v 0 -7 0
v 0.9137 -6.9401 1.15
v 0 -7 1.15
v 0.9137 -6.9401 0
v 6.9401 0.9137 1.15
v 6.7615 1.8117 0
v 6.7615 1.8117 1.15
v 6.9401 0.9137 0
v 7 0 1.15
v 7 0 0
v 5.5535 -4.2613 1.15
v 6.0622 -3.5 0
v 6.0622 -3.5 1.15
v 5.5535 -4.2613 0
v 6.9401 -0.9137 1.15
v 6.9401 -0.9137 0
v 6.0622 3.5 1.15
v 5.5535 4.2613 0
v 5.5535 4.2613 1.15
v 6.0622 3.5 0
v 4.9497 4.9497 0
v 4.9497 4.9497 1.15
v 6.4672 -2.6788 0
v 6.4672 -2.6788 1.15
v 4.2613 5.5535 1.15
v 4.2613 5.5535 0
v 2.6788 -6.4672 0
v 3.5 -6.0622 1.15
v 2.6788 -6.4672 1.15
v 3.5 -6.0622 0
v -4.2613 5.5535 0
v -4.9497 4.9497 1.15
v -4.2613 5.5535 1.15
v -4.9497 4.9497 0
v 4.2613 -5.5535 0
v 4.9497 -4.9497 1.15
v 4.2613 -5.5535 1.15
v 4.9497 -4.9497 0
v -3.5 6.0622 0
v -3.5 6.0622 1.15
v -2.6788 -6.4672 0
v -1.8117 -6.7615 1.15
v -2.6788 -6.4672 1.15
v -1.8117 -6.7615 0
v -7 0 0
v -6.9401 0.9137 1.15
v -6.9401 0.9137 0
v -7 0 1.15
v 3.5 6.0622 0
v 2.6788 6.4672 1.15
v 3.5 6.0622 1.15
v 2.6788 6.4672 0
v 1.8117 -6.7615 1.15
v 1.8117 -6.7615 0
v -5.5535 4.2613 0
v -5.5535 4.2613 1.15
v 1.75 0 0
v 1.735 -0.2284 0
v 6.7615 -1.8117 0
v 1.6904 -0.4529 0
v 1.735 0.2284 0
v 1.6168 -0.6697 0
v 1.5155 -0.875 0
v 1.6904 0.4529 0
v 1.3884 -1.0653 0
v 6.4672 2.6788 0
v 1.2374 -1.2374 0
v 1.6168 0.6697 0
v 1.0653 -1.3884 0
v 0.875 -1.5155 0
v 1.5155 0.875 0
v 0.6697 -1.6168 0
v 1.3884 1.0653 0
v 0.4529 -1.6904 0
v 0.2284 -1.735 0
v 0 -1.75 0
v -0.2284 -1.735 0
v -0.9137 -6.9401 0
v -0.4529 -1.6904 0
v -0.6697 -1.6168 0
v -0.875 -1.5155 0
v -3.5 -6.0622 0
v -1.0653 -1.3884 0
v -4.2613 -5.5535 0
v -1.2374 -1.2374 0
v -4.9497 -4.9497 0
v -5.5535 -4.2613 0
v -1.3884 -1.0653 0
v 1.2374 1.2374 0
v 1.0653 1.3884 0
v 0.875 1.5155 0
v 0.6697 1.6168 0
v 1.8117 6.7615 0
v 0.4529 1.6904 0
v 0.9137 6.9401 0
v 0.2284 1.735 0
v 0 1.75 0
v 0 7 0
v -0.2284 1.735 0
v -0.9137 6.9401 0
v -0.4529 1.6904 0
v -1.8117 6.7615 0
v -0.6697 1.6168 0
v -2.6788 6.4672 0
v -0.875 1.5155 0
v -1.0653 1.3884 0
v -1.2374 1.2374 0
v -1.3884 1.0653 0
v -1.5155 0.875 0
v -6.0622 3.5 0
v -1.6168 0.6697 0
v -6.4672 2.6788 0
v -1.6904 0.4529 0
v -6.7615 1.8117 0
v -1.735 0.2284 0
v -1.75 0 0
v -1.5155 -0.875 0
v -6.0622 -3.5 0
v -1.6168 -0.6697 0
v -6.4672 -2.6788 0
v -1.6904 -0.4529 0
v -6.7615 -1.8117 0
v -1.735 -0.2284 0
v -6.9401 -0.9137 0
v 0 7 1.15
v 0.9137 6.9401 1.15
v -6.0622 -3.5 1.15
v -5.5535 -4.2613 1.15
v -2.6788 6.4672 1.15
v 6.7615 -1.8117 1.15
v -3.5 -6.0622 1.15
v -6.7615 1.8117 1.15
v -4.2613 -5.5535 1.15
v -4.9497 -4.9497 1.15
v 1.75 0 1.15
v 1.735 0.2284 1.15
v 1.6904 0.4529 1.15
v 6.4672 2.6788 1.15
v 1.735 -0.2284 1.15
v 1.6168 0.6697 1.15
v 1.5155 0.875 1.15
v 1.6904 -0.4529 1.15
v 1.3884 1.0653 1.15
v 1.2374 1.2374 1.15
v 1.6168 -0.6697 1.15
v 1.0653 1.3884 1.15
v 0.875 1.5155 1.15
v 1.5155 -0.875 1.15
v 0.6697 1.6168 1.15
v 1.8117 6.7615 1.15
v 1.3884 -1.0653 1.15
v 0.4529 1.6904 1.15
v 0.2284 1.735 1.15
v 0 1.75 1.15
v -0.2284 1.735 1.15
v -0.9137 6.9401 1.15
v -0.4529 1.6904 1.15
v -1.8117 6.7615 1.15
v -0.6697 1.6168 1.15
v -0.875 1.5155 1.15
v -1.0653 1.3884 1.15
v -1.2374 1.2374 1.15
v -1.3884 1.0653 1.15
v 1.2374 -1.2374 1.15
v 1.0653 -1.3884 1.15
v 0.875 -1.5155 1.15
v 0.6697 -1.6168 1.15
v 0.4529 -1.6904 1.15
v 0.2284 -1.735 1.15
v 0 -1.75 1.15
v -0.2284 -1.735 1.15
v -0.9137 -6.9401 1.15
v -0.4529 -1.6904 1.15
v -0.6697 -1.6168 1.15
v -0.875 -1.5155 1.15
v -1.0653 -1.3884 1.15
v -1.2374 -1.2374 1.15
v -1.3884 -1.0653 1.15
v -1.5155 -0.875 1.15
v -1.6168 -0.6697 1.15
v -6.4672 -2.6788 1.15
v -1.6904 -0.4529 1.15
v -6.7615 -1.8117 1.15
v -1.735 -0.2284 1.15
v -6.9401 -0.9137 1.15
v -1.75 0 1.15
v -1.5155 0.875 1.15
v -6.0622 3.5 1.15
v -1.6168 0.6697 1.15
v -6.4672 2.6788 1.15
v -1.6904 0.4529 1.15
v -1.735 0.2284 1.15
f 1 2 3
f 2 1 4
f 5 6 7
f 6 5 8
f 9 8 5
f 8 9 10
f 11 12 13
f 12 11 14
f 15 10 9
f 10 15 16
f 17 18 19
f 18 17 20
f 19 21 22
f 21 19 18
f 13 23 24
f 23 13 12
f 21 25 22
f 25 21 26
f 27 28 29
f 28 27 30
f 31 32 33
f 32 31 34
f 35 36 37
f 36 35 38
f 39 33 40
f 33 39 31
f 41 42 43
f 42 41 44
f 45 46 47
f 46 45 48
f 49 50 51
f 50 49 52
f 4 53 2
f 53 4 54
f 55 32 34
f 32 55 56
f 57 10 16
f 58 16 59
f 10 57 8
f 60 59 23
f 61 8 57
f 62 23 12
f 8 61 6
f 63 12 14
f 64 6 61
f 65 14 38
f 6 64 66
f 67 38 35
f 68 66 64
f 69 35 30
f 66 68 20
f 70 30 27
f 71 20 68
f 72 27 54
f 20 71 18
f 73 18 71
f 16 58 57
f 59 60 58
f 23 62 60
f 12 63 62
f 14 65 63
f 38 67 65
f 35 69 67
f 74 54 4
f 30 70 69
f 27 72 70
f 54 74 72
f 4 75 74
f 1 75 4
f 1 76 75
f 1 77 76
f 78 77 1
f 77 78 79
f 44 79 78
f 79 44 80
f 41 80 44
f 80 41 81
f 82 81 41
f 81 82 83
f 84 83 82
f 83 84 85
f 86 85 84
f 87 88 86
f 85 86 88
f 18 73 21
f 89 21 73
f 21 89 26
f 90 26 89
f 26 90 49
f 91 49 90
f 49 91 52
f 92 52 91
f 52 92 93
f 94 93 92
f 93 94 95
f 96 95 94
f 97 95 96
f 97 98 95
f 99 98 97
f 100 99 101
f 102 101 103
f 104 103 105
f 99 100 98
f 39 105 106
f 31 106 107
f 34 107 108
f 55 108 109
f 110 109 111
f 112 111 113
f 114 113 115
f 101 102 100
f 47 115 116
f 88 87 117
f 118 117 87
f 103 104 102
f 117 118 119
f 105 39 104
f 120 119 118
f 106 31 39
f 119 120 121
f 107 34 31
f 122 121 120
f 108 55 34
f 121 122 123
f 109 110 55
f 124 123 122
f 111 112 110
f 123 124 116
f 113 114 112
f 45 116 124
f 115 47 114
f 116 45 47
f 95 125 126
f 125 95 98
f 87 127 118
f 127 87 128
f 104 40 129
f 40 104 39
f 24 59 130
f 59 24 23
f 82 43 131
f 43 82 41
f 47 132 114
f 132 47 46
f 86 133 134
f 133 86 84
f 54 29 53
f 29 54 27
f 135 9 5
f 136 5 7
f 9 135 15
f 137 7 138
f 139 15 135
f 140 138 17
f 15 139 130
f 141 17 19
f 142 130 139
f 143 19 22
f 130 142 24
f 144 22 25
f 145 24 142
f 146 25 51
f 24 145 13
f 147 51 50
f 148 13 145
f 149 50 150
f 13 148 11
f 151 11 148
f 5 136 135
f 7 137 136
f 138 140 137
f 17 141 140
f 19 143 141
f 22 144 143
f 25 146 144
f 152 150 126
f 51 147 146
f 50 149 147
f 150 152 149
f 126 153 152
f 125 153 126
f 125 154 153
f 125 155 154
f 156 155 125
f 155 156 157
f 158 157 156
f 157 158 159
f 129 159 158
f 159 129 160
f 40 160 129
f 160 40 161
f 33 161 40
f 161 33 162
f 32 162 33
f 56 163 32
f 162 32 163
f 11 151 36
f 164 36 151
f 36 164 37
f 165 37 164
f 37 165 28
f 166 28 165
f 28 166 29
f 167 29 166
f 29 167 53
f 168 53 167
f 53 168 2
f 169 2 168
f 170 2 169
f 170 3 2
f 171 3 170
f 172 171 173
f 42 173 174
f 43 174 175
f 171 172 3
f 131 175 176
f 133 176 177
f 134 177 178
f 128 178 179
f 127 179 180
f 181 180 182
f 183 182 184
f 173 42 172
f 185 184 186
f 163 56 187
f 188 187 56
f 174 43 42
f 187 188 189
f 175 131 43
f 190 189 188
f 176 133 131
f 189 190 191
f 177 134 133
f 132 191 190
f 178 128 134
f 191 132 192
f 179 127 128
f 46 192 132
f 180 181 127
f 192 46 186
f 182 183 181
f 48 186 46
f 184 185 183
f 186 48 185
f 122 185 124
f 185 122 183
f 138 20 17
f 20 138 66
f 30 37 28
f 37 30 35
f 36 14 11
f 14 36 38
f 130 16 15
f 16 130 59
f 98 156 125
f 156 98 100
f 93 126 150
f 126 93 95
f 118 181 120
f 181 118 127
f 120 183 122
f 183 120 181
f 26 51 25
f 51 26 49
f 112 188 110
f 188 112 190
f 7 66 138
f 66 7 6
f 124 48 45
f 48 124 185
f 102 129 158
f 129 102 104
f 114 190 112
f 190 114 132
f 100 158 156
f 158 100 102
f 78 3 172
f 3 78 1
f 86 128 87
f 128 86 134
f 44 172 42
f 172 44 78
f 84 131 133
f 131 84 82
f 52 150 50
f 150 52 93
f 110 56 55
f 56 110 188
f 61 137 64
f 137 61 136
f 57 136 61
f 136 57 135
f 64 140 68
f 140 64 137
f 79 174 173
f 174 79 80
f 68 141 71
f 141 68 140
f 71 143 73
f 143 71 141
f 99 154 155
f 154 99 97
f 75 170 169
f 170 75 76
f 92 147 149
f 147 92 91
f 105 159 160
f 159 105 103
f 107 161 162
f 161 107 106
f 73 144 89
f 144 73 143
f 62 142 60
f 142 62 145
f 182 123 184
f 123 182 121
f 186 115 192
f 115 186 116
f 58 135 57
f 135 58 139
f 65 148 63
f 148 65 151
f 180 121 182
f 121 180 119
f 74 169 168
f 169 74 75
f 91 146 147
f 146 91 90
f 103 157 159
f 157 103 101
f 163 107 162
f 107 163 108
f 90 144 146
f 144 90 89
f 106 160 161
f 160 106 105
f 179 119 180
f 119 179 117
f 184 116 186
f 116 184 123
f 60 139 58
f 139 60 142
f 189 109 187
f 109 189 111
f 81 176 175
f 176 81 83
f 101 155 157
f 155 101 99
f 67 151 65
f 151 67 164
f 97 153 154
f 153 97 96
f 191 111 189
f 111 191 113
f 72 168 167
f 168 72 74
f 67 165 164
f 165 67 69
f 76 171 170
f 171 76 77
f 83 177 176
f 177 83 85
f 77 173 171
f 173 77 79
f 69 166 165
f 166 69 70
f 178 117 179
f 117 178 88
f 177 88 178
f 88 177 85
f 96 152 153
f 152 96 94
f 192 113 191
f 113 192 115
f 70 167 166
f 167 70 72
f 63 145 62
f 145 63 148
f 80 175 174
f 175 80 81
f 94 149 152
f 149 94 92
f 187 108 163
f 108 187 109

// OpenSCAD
// file: parameters.scad
// =============================================================================
// Gen-AI Stacked dual-stator mid-rotor copper-max — WOUND-AWARE (HARD GATE)
// ONE mid dual-face Halbach rotor | TWO wound pancake stators | 18 coils ×145 t
// =============================================================================

wire_awg            = 26;
wire_od             = 0.45;
turns               = 145;      // 9 coils/stator ×2 = 18 ×145 ×~0.122 ≈ 318 m
fill                = 0.70;
layers_per_face     = 2;
wind_build_axial    = layers_per_face * wire_od * fill;   // 0.63
wind_build_radial   = 3 * wire_od * fill;                 // 0.945

coil_id_r           = 19.0;
coil_od_r           = 64.0;
span_deg            = 34.0;     // 9 stations × 40°
former_web          = 1.50;
flange_t            = 0.60;
wall                = 1.2;
slot_w              = 2.4;
mount_hole          = 3.5;
tab_len             = 7.0;

former_bare_h       = former_web + 2 * flange_t;            // 2.70
coil_envelope_h     = former_bare_h + 2 * wind_build_axial; // 3.96

run_clear           = 0.52;
gap_spacer_h        = run_clear + wind_build_axial;         // 1.15
m2m                 = coil_envelope_h + 2 * run_clear;      // 5.00 per gap

coil_stations       = 9;        // per stator; ×2 = 18 total
bay_r_in            = coil_id_r - 2.0 - wind_build_radial;
bay_r_out           = coil_od_r + 2.0 + wind_build_radial;
bay_span            = span_deg + 4.0;
bay_offset          = 2.0;
bay_depth           = former_bare_h + wind_build_axial;     // wound sits in bay
stator_back_web     = 2.0;
stator_thick        = bay_depth + stator_back_web;
stator_od           = 156.0;
shaft_clear_stator  = 38.0;
coil_mount_r        = 28.0;

large_pocket_d      = 20.3;
small_pocket_d      = 5.3;
pocket_h            = 5.2;
large_n             = 8;
R_large             = 42.0;
R_small_inner       = 28.0;
R_small_mid         = 42.0;
R_small_outer       = 58.0;
carrier_od          = 154.0;
mid_carrier_thick   = 12.0;
hub_h               = 10.0;
hub_od              = 30.0;
rotor_b_offset_deg  = 22.5;

shaft_bore          = 8.35;
bearing_d           = 21.85;
bearing_h           = 7.2;
m3_clear            = 3.5;
bolt_r_inner        = 36.0;
bolt_n_inner        = 6;
flange_bolt_r       = 72.0;
flange_bolt_n       = 6;
brace_r             = 68.0;
brace_d             = 4.3;
brace_n             = 4;

spacer_pad_od       = 14.0;
spacer_pad_id       = m3_clear;
endbell_od          = 156.0;
endbell_thick       = 8.0;
endbell_shaft_clear = 10.0;

$fn = 64;
// main file
// Gen-AI gap spacer — h = run_clear + wind_build_axial
include <parameters.scad>;
$fn = 48;
difference() {
    cylinder(d=spacer_pad_od, h=gap_spacer_h);
    translate([0, 0, -0.1]) cylinder(d=spacer_pad_id, h=gap_spacer_h + 0.2);
}
